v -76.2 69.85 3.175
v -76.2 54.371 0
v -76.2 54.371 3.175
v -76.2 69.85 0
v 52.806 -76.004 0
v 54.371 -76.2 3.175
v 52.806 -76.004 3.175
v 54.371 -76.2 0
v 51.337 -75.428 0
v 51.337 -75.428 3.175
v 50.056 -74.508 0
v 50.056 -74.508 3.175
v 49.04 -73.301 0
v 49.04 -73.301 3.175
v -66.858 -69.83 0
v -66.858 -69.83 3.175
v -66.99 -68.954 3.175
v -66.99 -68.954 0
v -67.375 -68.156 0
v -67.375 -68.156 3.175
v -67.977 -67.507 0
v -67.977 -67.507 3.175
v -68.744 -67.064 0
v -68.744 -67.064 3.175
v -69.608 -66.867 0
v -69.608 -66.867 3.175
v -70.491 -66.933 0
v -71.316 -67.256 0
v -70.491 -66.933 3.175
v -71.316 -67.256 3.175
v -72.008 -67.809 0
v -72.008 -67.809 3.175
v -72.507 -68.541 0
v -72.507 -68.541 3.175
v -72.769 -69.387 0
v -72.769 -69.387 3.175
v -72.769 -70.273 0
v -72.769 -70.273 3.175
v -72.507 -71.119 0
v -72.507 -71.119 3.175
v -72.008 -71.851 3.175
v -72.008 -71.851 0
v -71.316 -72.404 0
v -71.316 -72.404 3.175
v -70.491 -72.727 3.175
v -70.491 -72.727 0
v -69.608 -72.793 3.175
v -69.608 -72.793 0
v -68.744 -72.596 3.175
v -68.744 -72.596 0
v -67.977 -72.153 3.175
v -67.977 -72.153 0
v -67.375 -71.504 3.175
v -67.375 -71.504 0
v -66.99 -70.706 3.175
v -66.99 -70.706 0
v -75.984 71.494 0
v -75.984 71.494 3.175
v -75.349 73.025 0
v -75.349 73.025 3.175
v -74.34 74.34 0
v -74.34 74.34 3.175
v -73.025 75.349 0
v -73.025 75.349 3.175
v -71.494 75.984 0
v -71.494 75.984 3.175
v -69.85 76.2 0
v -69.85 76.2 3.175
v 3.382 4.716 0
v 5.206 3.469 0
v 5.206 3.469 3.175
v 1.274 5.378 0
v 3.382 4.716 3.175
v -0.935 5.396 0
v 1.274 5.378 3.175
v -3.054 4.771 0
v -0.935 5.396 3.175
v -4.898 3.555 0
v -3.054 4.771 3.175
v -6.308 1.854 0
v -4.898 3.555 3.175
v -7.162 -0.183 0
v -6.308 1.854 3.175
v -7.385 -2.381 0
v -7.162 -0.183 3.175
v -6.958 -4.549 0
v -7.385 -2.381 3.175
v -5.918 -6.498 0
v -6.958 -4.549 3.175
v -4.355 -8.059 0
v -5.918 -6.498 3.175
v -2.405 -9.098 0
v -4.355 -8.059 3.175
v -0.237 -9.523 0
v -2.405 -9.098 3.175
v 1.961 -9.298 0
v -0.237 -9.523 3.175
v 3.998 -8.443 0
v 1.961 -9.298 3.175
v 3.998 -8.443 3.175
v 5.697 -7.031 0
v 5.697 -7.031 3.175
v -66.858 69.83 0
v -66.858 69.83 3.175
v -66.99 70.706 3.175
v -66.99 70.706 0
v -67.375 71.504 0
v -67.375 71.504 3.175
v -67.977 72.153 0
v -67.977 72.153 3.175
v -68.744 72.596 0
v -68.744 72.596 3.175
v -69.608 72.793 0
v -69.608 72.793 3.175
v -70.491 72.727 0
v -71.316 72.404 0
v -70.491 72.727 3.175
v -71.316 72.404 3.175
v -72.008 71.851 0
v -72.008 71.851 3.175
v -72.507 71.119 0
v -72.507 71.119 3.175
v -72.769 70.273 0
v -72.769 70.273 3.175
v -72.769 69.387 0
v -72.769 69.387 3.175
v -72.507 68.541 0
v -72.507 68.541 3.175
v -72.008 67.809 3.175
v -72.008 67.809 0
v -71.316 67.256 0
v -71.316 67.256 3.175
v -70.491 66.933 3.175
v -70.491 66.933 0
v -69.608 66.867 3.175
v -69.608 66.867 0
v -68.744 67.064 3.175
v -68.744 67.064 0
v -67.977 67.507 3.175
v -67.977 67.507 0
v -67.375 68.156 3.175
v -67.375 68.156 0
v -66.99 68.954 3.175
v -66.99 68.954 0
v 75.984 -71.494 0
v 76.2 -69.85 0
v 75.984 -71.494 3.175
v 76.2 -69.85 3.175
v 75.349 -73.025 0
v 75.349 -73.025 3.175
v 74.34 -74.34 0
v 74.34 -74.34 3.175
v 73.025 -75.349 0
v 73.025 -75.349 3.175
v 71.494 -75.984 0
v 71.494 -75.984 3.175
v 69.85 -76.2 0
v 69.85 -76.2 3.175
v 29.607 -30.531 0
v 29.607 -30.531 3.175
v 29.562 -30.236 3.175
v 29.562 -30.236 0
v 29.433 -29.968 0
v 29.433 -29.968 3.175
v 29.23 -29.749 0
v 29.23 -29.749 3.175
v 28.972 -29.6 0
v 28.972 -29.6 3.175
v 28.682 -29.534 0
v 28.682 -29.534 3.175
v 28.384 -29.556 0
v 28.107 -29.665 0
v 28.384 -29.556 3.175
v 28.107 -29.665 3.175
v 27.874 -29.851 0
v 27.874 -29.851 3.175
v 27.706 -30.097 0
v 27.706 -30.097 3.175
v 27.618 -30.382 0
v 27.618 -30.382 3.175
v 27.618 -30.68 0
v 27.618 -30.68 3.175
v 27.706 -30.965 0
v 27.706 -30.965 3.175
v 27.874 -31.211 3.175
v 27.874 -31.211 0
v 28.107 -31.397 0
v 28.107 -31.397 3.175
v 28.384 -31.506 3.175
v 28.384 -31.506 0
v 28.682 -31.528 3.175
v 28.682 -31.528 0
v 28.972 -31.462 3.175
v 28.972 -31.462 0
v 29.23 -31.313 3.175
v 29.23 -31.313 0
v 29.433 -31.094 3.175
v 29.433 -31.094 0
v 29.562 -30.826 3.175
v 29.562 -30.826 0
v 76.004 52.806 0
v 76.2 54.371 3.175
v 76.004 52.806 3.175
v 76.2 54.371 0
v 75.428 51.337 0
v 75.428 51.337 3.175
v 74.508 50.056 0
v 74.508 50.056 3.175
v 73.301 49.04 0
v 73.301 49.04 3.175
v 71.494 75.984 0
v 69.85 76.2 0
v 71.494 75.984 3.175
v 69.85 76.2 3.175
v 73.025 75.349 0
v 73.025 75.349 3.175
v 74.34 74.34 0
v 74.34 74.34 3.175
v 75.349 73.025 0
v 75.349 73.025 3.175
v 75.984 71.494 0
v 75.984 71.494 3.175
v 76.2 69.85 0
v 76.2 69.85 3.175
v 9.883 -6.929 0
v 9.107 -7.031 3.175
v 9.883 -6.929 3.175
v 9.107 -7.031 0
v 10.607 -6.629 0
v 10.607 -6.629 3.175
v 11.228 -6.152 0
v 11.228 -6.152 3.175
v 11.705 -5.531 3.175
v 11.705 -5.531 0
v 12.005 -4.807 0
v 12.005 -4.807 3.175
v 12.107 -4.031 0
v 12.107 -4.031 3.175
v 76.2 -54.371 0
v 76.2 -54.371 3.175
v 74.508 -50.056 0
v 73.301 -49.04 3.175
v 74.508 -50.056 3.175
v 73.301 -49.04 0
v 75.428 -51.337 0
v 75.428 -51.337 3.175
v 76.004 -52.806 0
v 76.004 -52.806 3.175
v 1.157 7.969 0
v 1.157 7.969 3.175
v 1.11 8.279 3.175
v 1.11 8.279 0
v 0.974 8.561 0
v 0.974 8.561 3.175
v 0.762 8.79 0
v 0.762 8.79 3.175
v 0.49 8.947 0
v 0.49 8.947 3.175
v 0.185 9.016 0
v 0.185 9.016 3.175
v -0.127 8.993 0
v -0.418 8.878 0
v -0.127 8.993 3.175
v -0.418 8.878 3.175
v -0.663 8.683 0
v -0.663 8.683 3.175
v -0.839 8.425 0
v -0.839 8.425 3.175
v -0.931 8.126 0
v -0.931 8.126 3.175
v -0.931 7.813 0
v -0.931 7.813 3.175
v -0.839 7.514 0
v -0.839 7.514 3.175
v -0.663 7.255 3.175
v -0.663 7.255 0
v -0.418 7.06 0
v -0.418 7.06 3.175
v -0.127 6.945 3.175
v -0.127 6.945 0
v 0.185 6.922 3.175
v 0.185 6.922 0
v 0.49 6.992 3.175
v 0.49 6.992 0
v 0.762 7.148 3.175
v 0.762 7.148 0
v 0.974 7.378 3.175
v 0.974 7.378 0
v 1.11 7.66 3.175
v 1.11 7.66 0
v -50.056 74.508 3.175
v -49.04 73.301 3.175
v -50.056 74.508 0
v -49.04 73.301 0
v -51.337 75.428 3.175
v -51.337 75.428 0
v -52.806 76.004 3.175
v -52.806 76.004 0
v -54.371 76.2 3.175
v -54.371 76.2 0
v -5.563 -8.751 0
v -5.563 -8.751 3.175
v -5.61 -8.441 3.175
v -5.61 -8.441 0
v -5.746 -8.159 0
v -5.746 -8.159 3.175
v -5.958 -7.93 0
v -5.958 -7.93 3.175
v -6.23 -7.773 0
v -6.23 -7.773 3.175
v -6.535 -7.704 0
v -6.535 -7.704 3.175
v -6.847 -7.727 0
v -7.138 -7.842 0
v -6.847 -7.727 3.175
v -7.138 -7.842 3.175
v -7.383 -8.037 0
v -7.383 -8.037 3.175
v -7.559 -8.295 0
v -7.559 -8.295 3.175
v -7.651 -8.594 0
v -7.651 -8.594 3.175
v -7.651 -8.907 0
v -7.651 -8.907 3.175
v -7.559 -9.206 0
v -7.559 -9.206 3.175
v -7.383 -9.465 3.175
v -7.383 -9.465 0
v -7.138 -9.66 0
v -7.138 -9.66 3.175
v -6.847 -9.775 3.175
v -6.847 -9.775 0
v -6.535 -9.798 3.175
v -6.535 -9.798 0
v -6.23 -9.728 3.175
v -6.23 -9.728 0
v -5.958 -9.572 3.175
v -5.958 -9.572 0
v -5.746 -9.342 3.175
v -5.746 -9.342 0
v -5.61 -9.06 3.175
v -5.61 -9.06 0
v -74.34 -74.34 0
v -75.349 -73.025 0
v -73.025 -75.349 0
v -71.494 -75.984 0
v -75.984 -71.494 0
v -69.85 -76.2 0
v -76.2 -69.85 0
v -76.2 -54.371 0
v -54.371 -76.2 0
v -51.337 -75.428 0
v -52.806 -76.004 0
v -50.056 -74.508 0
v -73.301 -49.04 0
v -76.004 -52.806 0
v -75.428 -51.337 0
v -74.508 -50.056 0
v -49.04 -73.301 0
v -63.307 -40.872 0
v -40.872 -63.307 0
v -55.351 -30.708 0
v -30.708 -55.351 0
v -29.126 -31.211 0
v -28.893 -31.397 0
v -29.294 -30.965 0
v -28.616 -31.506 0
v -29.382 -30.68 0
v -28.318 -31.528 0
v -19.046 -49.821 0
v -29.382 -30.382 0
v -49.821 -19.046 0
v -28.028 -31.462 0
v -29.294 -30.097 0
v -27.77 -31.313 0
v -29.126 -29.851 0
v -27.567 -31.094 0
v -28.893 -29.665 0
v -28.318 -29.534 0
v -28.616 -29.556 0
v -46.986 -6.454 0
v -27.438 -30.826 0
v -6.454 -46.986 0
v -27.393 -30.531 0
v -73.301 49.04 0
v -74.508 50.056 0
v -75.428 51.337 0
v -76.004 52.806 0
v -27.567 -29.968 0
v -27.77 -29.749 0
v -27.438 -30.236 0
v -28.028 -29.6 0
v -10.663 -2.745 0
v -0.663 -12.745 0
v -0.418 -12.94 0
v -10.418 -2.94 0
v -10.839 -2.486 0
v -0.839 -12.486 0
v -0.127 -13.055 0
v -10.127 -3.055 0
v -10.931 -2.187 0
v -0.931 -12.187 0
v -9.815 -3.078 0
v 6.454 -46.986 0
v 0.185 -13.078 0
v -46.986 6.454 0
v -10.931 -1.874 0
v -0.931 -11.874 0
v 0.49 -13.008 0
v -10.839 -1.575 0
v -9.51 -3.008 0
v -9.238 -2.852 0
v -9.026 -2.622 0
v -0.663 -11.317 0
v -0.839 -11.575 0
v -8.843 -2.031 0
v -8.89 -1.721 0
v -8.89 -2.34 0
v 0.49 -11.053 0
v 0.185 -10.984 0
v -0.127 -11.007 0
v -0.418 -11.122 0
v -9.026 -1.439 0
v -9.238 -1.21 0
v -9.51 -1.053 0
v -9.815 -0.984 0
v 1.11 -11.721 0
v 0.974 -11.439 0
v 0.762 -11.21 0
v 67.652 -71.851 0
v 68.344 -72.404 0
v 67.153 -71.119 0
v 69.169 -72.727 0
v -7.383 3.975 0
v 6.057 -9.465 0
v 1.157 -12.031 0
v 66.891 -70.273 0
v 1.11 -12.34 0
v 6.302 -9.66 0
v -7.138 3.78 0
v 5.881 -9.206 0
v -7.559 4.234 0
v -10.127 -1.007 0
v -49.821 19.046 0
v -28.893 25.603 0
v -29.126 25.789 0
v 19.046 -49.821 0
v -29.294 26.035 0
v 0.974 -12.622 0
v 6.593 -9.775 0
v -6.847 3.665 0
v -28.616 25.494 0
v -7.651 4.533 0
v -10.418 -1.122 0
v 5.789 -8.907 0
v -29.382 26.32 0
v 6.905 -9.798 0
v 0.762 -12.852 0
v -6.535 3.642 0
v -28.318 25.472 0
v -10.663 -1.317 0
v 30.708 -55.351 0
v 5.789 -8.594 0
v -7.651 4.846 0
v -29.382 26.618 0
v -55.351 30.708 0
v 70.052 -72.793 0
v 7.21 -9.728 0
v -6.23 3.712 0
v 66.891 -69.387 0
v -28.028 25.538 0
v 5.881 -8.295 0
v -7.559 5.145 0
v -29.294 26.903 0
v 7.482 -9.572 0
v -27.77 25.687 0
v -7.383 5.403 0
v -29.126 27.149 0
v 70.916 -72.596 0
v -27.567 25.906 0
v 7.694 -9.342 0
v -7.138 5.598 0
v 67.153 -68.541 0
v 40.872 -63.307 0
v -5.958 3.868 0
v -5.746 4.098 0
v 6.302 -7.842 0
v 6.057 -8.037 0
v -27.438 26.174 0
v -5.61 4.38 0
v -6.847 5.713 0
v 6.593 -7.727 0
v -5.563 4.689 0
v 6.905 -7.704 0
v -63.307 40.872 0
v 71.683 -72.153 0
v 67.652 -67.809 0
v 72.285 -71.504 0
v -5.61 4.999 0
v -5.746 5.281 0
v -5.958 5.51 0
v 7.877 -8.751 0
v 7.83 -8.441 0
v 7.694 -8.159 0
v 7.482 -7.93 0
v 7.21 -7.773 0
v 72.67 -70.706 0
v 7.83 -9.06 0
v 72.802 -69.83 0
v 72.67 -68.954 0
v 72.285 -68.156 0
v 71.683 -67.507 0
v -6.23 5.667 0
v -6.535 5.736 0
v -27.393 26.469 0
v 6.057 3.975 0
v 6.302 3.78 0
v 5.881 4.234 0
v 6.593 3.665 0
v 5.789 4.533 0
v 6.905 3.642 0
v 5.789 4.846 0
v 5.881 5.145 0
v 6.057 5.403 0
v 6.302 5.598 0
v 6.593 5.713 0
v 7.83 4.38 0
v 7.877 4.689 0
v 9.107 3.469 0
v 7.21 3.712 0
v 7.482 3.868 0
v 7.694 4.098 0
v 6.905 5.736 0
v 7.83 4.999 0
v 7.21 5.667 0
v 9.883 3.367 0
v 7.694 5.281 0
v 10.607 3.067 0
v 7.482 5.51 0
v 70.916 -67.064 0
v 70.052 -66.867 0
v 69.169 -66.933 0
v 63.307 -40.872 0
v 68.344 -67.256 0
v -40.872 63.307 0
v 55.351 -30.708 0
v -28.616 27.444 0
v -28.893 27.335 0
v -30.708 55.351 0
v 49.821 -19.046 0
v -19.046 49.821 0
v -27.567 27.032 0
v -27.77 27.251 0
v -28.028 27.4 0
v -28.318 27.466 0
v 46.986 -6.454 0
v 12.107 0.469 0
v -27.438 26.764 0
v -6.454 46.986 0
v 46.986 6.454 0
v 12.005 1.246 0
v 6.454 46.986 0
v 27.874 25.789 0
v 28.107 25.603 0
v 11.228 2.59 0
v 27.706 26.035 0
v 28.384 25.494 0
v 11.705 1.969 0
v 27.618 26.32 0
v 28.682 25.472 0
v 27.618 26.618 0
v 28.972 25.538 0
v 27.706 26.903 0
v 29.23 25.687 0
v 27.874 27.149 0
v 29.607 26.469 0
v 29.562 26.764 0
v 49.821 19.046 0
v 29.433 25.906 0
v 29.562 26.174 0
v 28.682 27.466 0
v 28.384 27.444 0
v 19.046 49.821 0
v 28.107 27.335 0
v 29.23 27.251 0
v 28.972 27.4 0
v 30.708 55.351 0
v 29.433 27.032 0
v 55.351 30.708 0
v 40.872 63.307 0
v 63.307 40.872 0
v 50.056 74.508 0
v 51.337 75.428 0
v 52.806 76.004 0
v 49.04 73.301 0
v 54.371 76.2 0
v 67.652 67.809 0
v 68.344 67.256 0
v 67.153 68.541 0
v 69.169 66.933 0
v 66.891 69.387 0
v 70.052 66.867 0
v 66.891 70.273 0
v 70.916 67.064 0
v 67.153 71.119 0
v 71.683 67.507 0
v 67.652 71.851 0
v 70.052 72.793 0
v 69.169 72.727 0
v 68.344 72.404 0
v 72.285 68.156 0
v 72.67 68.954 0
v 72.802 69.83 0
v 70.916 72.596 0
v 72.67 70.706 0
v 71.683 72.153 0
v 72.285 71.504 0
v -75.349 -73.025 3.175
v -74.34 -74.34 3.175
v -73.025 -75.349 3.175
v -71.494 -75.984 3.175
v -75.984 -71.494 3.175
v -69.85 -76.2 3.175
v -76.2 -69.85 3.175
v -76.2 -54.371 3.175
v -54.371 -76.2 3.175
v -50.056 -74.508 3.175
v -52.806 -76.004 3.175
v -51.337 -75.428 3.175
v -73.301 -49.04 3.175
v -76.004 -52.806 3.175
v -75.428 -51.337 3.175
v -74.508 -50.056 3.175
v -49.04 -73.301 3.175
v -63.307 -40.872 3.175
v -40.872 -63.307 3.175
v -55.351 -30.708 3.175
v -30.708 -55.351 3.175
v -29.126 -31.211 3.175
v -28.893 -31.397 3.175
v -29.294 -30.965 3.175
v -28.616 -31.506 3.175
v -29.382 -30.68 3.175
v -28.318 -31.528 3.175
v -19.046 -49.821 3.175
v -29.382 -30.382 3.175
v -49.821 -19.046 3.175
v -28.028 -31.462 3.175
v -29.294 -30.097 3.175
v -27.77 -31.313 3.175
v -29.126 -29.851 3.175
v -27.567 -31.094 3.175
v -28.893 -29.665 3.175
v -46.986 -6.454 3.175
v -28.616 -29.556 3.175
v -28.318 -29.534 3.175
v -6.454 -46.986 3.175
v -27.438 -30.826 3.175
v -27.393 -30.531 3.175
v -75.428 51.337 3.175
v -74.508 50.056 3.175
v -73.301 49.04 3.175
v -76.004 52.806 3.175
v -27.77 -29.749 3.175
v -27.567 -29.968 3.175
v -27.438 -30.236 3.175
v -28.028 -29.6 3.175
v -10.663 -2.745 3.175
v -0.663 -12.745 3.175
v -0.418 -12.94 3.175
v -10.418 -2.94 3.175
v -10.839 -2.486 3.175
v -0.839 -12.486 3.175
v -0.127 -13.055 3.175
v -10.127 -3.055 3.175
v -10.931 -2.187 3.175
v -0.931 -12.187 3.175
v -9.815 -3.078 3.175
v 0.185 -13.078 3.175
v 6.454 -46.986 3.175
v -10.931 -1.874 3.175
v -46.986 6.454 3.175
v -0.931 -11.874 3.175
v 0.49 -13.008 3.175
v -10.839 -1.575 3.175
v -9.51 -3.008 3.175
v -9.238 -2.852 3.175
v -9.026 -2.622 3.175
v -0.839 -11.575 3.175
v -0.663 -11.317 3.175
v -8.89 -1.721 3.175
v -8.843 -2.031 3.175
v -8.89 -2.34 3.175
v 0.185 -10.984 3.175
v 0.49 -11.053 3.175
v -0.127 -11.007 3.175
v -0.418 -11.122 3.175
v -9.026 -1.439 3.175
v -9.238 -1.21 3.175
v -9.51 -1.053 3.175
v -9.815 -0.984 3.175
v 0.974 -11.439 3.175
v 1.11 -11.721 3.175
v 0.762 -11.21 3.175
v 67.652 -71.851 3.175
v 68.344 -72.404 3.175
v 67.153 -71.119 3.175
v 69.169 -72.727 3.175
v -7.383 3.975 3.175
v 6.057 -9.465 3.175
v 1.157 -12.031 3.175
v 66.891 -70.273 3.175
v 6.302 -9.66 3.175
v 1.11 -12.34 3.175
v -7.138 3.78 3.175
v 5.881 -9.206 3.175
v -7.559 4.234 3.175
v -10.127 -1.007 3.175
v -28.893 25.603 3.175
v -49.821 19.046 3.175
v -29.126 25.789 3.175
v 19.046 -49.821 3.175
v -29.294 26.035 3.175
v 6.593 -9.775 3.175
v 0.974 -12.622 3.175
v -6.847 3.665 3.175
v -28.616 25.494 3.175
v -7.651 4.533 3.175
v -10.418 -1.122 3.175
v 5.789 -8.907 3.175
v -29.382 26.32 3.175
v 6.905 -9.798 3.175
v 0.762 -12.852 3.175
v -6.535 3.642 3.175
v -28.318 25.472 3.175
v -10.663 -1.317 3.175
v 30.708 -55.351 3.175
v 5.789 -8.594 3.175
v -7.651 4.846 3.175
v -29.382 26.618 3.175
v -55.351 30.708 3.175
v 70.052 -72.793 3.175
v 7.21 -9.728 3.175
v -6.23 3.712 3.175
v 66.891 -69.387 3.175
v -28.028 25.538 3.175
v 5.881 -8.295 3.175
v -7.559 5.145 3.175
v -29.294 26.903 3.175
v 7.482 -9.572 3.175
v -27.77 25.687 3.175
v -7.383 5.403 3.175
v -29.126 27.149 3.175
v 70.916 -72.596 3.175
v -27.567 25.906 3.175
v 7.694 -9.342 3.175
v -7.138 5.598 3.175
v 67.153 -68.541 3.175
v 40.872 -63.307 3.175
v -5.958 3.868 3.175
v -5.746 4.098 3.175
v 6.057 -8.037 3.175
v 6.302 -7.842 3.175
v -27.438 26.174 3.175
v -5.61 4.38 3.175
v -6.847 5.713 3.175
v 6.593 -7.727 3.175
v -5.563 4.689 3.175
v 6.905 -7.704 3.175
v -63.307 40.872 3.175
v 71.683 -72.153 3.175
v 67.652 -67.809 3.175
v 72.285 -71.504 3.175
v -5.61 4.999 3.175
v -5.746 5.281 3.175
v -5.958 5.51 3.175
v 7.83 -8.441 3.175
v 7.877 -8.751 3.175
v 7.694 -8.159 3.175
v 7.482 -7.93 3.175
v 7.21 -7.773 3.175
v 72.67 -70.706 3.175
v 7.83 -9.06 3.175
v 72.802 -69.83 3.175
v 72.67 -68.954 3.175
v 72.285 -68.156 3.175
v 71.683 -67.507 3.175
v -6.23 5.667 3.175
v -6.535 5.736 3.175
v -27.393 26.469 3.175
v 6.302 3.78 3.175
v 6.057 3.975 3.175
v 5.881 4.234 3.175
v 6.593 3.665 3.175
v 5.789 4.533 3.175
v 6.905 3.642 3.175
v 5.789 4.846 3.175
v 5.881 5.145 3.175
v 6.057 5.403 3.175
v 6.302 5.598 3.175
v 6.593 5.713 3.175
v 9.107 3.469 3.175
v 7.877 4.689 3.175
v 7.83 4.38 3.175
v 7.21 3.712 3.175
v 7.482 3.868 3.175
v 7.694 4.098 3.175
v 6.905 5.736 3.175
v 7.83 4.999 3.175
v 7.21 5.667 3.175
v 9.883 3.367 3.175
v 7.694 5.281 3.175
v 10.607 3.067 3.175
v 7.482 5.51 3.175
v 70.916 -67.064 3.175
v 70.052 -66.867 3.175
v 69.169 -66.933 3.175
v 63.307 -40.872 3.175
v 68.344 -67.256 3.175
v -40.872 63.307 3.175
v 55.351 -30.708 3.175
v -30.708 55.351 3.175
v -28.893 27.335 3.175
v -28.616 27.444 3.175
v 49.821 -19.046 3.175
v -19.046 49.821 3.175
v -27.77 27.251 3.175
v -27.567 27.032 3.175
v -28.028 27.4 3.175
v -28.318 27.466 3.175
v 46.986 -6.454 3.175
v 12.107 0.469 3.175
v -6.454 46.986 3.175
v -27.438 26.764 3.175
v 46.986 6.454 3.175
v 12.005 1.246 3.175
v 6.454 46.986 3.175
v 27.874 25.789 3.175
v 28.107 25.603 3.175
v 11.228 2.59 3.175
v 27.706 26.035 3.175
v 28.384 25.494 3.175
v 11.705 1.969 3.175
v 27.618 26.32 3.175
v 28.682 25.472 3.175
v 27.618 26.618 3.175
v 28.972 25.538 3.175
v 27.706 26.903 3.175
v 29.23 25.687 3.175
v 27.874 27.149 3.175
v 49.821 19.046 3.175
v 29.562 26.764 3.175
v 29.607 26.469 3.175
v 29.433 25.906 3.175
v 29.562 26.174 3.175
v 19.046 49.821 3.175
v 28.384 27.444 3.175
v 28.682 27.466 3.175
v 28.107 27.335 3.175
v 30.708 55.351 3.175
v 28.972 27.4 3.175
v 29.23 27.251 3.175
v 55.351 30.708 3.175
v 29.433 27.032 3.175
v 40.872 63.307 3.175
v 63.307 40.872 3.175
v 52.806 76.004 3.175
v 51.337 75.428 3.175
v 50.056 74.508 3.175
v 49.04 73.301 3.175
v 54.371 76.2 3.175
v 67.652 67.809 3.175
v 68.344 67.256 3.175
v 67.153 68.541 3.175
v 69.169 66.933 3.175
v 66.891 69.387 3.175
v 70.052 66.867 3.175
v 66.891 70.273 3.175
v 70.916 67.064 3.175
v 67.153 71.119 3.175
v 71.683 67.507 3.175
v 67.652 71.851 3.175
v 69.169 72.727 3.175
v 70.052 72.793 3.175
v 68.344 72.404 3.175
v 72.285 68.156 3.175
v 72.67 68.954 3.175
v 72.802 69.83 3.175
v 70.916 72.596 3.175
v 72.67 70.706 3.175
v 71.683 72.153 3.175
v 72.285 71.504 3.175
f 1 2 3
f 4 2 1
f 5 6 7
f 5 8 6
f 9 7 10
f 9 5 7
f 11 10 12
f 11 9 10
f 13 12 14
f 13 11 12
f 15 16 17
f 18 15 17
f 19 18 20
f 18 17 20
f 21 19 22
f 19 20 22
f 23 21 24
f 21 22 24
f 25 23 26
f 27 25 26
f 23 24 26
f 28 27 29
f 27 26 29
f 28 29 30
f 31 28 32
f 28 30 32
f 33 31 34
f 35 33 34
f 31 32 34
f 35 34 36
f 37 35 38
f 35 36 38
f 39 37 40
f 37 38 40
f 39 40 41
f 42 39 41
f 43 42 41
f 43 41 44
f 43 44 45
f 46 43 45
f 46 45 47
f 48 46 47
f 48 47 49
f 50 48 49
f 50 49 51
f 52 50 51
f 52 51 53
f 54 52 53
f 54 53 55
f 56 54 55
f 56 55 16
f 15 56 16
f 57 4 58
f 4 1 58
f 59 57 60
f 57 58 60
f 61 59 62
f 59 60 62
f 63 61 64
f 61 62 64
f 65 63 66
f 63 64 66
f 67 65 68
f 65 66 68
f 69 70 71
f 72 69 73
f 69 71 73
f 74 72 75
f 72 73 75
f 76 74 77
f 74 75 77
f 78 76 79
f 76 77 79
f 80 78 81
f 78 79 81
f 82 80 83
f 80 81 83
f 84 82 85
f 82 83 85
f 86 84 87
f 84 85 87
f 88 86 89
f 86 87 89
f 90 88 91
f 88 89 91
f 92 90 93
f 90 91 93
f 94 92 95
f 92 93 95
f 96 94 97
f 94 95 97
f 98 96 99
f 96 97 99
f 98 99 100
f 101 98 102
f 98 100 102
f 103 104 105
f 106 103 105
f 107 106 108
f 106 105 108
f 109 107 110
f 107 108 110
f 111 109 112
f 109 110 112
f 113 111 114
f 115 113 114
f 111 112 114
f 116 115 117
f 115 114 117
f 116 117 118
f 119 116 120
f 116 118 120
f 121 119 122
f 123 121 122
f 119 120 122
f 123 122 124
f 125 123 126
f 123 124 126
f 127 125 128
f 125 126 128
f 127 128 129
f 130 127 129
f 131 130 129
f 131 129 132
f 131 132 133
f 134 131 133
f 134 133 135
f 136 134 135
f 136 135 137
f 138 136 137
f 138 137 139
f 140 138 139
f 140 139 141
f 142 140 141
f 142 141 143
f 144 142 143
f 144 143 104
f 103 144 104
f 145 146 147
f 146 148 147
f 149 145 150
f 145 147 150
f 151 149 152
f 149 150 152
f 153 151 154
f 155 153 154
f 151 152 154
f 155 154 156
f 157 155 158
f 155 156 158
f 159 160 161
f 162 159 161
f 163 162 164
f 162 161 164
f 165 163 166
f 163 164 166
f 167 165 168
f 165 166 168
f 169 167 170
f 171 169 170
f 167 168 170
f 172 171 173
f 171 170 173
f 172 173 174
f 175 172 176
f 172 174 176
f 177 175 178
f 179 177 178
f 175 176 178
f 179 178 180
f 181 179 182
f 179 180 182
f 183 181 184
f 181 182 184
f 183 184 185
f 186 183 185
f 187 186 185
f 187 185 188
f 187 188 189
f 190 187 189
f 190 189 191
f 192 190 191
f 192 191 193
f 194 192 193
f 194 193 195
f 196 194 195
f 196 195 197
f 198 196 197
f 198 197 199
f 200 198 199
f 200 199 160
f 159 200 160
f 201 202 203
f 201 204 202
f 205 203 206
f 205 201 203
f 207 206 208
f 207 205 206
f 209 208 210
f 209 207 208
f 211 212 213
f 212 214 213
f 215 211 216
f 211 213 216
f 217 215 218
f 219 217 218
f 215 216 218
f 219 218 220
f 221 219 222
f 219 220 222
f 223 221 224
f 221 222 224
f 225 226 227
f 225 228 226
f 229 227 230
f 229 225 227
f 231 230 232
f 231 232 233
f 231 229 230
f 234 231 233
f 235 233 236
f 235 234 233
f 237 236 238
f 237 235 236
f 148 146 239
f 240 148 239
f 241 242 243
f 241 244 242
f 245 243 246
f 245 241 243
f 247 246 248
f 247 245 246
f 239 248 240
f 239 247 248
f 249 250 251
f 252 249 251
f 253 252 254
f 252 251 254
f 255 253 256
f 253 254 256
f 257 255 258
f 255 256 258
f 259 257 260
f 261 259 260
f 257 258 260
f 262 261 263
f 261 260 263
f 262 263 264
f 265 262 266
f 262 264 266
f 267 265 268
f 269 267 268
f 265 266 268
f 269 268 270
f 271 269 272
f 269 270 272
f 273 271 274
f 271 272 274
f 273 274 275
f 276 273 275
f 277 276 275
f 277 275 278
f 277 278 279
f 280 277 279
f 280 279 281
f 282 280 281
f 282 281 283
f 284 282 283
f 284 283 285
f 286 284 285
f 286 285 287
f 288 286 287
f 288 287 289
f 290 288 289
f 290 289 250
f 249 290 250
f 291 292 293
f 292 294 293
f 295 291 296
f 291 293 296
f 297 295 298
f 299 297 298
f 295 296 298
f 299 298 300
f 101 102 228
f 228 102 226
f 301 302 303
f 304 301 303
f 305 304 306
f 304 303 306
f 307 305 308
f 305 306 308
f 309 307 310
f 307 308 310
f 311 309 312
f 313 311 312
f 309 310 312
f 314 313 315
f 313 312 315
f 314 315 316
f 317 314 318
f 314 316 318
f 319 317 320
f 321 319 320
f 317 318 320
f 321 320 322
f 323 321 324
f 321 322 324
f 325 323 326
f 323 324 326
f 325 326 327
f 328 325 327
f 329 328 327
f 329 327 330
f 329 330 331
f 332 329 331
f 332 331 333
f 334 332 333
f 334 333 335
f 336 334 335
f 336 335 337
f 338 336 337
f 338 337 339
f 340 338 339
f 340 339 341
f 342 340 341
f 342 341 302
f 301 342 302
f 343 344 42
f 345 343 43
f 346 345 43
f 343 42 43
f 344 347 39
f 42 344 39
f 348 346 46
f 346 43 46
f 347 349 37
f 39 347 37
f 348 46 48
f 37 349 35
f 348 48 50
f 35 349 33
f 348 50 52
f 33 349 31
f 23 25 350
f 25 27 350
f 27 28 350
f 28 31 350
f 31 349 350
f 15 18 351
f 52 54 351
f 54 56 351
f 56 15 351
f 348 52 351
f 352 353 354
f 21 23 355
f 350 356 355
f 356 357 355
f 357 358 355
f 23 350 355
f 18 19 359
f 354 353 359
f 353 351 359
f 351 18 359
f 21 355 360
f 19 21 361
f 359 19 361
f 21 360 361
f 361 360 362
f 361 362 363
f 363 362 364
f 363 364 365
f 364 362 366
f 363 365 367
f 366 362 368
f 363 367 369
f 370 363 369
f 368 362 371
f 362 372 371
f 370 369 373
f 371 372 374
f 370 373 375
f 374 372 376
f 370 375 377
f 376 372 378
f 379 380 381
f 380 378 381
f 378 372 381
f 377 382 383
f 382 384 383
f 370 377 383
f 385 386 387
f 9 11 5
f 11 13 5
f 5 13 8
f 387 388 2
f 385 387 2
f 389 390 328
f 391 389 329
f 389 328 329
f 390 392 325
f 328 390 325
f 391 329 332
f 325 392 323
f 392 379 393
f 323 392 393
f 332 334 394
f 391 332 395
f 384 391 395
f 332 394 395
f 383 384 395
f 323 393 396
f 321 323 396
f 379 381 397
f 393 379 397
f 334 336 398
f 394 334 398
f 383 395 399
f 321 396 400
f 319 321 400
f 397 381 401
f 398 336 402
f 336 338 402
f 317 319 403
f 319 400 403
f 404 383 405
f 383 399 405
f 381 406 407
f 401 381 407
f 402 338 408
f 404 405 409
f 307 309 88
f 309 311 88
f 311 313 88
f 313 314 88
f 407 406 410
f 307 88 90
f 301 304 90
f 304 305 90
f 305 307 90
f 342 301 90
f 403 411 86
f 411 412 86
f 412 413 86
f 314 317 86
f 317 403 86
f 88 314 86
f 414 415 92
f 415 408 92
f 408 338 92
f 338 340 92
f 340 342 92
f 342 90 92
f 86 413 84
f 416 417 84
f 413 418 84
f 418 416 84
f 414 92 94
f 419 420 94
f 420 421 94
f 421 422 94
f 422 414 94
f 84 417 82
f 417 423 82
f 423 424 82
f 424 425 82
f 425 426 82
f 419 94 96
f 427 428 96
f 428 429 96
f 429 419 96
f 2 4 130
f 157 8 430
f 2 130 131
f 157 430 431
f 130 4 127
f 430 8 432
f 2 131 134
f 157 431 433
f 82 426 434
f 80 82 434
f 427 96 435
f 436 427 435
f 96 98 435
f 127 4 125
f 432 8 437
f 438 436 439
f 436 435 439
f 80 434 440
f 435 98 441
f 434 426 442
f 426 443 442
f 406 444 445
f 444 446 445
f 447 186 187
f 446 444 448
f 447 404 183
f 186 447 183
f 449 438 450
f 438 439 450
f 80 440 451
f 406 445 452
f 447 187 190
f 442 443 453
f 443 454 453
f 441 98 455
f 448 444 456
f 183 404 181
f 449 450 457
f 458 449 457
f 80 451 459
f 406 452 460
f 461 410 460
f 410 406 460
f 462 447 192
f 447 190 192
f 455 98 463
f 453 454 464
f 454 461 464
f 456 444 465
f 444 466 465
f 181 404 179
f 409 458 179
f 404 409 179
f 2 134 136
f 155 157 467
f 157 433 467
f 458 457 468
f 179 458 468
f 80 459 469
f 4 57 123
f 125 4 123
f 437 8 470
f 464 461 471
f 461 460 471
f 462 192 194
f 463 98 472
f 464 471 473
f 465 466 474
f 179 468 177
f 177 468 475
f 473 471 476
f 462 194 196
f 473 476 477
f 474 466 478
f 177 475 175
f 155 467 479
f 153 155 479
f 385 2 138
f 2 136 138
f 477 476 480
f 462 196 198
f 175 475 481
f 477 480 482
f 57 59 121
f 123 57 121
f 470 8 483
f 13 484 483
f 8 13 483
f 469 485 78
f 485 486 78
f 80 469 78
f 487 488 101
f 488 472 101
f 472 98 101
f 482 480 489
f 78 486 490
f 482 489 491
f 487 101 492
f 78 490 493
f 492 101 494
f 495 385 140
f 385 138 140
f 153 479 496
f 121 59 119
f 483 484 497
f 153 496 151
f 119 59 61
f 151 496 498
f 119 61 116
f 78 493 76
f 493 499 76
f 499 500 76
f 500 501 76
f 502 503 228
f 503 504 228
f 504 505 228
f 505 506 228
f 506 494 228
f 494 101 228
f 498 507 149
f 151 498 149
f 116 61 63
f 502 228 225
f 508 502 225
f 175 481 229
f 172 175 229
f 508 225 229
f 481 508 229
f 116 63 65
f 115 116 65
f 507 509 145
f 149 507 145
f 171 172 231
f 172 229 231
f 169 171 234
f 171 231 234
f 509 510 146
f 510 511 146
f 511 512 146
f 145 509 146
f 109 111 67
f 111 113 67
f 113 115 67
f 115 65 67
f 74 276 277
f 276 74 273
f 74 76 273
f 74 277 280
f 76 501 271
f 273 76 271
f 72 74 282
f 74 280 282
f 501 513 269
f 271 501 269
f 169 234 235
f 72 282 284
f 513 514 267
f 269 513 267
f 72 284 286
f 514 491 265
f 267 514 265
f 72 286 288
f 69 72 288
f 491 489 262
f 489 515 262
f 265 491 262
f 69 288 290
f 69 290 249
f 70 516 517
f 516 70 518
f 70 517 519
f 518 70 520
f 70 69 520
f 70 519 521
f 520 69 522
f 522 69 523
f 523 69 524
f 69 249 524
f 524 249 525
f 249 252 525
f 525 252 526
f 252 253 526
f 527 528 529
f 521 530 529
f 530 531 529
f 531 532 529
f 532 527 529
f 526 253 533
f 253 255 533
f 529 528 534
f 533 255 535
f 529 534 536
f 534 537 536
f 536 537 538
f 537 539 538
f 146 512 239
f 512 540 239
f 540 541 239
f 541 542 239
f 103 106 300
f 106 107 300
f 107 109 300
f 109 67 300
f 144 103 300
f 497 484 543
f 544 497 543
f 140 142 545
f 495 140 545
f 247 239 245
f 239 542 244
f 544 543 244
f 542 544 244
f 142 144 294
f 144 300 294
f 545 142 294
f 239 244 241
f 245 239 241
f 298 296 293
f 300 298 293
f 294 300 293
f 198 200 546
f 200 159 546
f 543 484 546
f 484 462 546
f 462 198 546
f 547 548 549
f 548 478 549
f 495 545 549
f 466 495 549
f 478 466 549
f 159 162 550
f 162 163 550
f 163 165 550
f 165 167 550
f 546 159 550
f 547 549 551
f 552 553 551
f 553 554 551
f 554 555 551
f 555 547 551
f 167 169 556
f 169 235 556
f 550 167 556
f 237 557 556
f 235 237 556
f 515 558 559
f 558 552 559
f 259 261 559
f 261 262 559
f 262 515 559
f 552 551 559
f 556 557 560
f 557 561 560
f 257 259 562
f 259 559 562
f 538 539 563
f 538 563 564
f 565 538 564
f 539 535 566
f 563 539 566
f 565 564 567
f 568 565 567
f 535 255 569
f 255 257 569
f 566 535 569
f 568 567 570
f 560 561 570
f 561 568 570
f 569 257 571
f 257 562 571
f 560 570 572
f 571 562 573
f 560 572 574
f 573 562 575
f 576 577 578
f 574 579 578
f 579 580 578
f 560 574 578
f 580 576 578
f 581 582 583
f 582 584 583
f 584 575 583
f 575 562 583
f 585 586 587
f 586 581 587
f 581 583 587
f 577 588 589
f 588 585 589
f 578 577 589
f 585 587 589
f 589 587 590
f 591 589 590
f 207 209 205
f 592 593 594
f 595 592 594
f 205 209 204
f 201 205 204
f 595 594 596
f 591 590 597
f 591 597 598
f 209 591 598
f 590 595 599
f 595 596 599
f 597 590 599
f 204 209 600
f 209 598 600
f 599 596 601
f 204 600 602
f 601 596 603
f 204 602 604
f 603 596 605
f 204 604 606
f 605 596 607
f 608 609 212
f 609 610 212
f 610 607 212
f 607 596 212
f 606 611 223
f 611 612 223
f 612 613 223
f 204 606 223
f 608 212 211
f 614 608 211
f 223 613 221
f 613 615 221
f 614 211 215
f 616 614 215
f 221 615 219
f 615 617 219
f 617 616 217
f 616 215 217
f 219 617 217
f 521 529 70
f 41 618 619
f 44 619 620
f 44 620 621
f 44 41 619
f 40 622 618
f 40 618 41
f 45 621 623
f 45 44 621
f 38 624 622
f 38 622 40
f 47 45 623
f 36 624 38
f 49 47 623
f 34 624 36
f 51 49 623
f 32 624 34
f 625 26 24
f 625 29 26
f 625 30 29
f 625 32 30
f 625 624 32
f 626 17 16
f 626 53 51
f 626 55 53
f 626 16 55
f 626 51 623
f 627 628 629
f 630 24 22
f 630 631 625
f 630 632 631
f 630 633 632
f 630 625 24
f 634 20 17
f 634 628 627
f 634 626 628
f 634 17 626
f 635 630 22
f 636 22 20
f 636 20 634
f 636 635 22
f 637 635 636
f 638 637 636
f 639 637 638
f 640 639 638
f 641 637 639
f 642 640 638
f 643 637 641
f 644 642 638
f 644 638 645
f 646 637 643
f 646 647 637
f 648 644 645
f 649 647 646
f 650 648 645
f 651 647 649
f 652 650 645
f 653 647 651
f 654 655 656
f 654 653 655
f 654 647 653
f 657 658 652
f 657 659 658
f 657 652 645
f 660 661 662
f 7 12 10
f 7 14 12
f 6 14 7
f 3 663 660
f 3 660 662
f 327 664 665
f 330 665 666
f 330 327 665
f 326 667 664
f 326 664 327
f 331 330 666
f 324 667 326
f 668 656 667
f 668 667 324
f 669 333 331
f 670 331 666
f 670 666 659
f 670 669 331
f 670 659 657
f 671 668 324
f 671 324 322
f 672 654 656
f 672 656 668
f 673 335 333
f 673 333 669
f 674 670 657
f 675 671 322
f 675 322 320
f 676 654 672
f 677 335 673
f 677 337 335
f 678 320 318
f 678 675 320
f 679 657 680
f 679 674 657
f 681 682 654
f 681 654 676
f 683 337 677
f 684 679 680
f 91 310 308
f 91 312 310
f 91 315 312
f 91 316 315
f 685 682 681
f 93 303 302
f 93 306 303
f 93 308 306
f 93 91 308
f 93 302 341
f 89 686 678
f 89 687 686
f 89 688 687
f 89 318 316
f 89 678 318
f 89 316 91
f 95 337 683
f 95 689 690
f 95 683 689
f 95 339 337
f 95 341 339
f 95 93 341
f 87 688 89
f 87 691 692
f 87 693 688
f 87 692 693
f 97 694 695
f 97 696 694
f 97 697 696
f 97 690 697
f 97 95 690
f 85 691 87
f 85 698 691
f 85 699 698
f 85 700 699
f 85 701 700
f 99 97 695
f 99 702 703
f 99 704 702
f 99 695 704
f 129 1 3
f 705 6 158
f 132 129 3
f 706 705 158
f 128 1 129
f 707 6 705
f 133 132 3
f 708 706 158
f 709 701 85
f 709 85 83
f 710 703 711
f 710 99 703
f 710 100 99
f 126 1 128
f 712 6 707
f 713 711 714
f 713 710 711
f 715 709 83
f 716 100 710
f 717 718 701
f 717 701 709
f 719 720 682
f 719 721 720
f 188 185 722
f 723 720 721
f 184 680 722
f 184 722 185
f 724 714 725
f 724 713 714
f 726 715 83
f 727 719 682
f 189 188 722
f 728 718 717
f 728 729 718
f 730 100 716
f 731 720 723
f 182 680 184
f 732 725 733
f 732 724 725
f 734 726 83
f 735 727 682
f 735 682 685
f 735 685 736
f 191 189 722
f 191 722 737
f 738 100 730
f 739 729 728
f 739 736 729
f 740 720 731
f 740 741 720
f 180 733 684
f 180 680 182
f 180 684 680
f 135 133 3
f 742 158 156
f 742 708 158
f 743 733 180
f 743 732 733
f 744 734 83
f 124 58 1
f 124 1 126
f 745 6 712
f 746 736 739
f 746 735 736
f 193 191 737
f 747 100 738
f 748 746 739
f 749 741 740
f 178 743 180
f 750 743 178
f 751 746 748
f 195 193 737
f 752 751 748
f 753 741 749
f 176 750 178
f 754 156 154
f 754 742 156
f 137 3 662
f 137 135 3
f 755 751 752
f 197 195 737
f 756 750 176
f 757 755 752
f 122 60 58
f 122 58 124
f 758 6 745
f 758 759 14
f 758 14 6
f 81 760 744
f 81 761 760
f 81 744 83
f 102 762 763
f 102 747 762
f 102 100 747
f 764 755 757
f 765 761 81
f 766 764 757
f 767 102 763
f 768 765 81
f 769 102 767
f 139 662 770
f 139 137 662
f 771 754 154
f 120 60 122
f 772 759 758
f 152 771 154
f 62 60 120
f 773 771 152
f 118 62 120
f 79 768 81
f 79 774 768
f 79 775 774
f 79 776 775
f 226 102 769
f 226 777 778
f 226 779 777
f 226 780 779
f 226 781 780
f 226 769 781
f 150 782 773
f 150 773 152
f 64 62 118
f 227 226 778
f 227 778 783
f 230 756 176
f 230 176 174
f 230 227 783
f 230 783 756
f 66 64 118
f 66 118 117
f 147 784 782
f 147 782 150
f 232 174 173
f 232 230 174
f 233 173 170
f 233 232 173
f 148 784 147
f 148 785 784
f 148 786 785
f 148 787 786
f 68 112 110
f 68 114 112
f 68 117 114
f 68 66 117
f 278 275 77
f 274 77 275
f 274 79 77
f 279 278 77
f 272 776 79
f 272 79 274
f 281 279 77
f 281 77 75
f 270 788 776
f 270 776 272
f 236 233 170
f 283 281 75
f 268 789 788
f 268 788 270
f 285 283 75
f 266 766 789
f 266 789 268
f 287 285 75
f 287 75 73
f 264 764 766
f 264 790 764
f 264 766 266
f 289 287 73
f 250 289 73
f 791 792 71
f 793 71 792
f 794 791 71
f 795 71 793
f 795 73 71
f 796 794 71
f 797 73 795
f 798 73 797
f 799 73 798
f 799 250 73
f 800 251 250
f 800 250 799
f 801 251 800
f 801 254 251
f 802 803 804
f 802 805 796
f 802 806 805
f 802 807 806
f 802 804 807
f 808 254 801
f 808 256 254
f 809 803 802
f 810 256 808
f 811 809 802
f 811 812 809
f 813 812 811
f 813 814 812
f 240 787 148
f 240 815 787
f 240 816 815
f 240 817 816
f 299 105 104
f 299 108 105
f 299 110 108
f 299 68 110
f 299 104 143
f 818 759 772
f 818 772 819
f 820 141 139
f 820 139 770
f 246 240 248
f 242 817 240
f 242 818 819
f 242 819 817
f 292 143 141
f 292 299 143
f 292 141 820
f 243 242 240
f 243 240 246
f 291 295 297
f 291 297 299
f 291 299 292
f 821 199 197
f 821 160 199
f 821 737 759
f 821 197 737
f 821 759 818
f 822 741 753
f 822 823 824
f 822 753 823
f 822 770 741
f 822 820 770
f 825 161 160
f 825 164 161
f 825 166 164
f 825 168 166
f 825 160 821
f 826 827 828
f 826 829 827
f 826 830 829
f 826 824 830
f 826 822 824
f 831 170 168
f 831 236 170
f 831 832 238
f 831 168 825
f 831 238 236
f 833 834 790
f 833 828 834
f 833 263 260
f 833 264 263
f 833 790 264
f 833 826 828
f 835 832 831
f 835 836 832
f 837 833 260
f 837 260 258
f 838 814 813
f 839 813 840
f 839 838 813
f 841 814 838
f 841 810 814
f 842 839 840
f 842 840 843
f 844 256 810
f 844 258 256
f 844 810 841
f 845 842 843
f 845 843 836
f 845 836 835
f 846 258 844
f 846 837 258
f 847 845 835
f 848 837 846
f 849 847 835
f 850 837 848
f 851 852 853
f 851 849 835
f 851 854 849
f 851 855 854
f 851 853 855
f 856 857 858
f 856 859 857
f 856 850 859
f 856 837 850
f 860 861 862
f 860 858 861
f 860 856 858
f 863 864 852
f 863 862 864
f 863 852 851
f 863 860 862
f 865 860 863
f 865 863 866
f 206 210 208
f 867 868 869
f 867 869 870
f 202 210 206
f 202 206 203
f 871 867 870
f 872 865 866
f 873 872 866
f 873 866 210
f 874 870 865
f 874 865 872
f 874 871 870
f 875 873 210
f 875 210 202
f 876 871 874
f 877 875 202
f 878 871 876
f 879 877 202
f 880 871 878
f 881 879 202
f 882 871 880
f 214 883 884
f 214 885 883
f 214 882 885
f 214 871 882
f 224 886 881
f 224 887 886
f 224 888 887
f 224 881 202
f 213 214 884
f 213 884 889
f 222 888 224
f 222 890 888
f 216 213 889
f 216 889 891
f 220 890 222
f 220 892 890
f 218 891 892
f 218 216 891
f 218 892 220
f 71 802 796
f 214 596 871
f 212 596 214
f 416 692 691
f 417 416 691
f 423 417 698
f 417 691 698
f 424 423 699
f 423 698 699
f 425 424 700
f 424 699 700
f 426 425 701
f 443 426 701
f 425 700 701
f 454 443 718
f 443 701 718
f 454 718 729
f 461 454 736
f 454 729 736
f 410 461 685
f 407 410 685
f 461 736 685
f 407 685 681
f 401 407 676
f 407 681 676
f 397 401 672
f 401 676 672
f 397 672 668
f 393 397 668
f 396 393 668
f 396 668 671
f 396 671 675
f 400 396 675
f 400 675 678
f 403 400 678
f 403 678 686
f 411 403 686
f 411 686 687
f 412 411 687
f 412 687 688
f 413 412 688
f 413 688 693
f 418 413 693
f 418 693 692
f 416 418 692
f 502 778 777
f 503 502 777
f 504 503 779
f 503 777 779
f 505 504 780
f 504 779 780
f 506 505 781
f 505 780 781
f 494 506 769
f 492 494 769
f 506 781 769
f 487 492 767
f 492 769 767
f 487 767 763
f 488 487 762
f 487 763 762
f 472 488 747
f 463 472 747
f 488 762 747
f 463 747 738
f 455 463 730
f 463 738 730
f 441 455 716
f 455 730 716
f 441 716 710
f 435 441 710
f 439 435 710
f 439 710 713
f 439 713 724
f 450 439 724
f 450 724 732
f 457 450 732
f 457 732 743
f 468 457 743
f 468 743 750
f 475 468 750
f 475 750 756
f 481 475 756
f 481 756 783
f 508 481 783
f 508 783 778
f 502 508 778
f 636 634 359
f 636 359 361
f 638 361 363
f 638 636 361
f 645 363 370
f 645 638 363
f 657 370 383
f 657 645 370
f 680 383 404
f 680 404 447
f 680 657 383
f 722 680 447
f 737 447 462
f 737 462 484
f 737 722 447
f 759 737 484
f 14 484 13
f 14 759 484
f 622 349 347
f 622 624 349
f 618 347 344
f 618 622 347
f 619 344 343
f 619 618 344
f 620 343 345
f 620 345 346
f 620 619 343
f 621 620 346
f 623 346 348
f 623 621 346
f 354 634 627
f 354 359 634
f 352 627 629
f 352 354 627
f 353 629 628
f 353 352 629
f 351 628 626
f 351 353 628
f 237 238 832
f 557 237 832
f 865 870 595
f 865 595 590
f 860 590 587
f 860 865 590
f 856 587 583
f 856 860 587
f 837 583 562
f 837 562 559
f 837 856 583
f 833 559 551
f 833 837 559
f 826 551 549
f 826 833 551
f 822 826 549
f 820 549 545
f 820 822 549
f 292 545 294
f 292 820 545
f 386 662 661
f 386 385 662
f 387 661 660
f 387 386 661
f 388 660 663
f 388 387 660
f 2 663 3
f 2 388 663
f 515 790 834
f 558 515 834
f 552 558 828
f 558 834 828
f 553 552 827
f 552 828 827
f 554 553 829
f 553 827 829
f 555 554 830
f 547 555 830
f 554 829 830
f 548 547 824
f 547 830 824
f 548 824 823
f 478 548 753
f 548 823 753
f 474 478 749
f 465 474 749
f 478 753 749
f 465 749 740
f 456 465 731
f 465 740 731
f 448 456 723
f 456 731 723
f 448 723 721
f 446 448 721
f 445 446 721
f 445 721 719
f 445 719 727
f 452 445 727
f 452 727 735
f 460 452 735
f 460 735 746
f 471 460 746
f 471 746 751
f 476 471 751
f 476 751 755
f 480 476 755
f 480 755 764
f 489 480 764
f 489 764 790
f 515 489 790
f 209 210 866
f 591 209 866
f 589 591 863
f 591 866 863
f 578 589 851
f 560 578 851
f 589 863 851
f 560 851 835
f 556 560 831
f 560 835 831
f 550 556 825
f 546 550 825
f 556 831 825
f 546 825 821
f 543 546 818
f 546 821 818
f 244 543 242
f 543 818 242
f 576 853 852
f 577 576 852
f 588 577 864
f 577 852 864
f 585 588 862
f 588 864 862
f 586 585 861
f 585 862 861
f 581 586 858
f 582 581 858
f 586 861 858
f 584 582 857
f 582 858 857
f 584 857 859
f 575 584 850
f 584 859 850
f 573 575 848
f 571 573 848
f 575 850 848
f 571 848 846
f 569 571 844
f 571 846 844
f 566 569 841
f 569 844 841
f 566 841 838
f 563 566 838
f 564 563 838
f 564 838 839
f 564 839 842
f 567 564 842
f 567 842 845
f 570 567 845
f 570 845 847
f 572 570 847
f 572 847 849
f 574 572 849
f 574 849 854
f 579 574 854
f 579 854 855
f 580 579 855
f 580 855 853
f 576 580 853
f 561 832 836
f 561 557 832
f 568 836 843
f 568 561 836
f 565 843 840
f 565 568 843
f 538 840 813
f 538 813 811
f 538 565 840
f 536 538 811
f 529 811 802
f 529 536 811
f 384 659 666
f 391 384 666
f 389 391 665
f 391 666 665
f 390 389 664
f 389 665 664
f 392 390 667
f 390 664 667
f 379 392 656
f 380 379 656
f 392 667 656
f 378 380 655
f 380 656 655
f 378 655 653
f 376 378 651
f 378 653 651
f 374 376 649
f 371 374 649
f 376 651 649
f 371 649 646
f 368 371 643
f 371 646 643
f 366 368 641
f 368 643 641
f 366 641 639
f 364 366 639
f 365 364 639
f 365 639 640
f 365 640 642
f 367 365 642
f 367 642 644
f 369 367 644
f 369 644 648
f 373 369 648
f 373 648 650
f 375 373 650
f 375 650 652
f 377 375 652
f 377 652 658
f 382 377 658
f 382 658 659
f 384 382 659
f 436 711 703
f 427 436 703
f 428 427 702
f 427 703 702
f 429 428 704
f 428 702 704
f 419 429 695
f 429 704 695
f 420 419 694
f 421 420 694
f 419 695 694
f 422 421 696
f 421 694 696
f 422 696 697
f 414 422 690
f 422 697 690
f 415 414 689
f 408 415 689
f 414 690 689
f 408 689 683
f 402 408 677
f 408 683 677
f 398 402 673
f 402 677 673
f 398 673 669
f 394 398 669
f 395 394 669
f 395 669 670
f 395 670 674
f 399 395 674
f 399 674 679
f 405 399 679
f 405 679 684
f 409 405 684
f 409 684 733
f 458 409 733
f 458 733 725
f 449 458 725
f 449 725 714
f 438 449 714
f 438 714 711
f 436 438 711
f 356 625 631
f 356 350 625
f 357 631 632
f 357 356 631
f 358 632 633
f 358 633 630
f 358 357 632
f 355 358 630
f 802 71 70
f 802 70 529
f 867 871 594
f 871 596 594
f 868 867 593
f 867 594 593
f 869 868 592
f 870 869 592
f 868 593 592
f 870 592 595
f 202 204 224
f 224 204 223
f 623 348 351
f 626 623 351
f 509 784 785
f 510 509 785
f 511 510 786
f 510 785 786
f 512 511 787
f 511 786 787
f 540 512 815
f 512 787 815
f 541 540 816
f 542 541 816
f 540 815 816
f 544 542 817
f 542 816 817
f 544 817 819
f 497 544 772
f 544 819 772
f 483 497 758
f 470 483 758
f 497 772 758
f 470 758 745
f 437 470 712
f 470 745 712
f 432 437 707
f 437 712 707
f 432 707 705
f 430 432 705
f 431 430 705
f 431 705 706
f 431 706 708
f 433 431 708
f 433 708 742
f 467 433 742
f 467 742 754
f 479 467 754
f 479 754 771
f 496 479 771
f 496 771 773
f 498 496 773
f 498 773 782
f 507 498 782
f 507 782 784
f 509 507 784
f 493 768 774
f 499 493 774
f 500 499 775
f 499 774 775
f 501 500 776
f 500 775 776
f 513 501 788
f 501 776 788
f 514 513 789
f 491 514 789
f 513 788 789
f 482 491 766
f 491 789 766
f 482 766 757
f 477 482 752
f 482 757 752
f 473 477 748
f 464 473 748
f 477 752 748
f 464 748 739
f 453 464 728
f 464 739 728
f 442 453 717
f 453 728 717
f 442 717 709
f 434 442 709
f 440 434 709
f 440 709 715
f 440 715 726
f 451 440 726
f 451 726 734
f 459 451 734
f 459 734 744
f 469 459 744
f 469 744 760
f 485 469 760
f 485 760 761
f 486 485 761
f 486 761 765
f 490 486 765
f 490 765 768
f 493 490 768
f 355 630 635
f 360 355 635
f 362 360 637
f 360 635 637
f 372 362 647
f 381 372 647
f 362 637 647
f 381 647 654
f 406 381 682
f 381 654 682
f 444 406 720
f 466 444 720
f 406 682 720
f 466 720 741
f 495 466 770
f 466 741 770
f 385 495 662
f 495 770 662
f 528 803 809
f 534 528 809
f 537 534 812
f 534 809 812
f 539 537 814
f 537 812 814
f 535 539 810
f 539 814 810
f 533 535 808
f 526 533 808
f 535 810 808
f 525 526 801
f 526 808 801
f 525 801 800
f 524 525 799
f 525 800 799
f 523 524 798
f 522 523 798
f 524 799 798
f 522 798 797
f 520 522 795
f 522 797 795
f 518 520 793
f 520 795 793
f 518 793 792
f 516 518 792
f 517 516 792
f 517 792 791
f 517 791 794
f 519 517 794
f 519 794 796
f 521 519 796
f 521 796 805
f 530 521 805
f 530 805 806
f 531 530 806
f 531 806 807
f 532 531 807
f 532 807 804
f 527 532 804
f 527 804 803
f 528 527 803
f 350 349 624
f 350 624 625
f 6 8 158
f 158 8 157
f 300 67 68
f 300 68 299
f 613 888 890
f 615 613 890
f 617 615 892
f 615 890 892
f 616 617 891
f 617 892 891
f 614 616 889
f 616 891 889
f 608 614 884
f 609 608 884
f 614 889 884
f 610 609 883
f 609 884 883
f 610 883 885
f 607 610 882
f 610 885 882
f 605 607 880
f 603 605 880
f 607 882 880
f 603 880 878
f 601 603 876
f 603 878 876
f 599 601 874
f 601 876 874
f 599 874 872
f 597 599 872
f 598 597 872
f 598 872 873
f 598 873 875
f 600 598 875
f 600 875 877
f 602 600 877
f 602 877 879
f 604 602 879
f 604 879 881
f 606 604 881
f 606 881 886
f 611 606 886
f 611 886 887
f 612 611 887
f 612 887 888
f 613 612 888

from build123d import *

# Parameters (mm, degrees)
SKETCH3_W             = 152.4
SKETCH3_H             = 152.4
BOSS_EXTRUDE3_DEPTH   = 3.175
SKETCH13_R            = 7.5
CUT_EXTRUDE5_DEPTH    = 4.175
SKETCH15_R            = 1
CUT_EXTRUDE6_DEPTH    = 4.175
SKETCH17_W            = 12
SKETCH17_H            = 10.5
CUT_EXTRUDE7_DEPTH    = 4.175
FILLET1_R             = 3
SKETCH19_R            = 1.05
CUT_EXTRUDE8_DEPTH    = 4.175
SKETCH20_R            = 2.9718
BOLT_HOLES_DEPTH      = 1
BOLT_HOLES_DEPTH_BACK = 4.175
CUT_EXTRUDE12_DEPTH   = 3.175
FILLET2_R             = 6.35
MIRROR5_COPY_1_DEPTH  = 3.175
FILLET3_R             = 6.35
FILLET4_R             = 6.35


with BuildPart() as part:
    # Sketch3 → Boss-Extrude3 (new body)
    with BuildSketch(Plane.XY):
        Rectangle(SKETCH3_W, SKETCH3_H)
    extrude(amount=BOSS_EXTRUDE3_DEPTH)

    # Sketch13 → Cut-Extrude5 (cut, through all)
    with BuildSketch(Plane(origin=(0.106889783, -2.03090588, 3.175), x_dir=(1, 0, 0), z_dir=(0, 0, 1))):
        Circle(SKETCH13_R)
    extrude(amount=-CUT_EXTRUDE5_DEPTH, mode=Mode.SUBTRACT)

    # Sketch15 → Cut-Extrude6 (cut, through all)
    with BuildSketch(Plane(origin=(0.106889783, -2.03090588, 3.175), x_dir=(1, 0, 0), z_dir=(0, 0, 1))):
        with Locations((-28.5, -28.5)):
            Circle(SKETCH15_R)
        with Locations((-28.5, 28.5)):
            Circle(SKETCH15_R)
        with Locations((28.5, -28.5)):
            Circle(SKETCH15_R)
        with Locations((28.5, 28.5)):
            Circle(SKETCH15_R)
    extrude(amount=-CUT_EXTRUDE6_DEPTH, mode=Mode.SUBTRACT)

    # Sketch17 → Cut-Extrude7 (cut, through all)
    with BuildSketch(Plane(origin=(0.106889783, -2.03090588, 3.175), x_dir=(1, 0, 0), z_dir=(0, 0, 1))):
        with Locations((6, 0.25)):
            Rectangle(SKETCH17_W, SKETCH17_H)
    extrude(amount=-CUT_EXTRUDE7_DEPTH, mode=Mode.SUBTRACT)

    # Fillet1
    fillet1_edges = [part.edges().sort_by_distance(p)[0] for p in [
        (12.106889783, -7.03090588, 1.5875),
        (12.106889783, 3.46909412, 1.5875),
    ]]
    fillet(fillet1_edges, radius=FILLET1_R)

    # Sketch19 → Cut-Extrude8 (cut, through all)
    with BuildSketch(Plane(origin=(0.106889783, -2.03090588, 3.175), x_dir=(1, 0, 0), z_dir=(0, 0, 1))):
        with Locations((6.72, 6.72)):
            Circle(SKETCH19_R)
        with Locations((-6.72, 6.72)):
            Circle(SKETCH19_R)
        with Locations((-6.72, -6.72)):
            Circle(SKETCH19_R)
        with Locations((6.72, -6.72)):
            Circle(SKETCH19_R)
        with Locations((0, 10)):
            Circle(SKETCH19_R)
        with Locations((-10, 0)):
            Circle(SKETCH19_R)
        with Locations((0, -10)):
            Circle(SKETCH19_R)
    extrude(amount=-CUT_EXTRUDE8_DEPTH, mode=Mode.SUBTRACT)

    # Sketch20 → Bolt Holes (cut, two sides)
    with BuildSketch(Plane.XY.offset(3.175)) as bolt_holes_sk:
        with Locations((-69.83, 69.83)):
            Circle(SKETCH20_R)
        with Locations((69.83, 69.83)):
            Circle(SKETCH20_R)
        with Locations((69.83, -69.83)):
            Circle(SKETCH20_R)
        with Locations((-69.83, -69.83)):
            Circle(SKETCH20_R)
    extrude(amount=BOLT_HOLES_DEPTH, mode=Mode.SUBTRACT)
    extrude(bolt_holes_sk.sketch, amount=-BOLT_HOLES_DEPTH_BACK, mode=Mode.SUBTRACT)

    # Sketch25 → Cut-Extrude12 (cut)
    with BuildSketch(Plane.XY.offset(3.175)):
        with BuildLine():
            Line((-76.2, 50.8), (-76.2, -50.8))
            ThreePointArc((-76.2, -50.8), (-46.628854397, 0), (-76.2, 50.8))
        make_face()
    cut_extrude12 = extrude(amount=-CUT_EXTRUDE12_DEPTH, mode=Mode.SUBTRACT)

    # Fillet2
    fillet2_edges = [part.edges().sort_by_distance(p)[0] for p in [
        (-76.2, -50.8, 1.5875),
        (-76.2, 50.8, 1.5875),
        (-76.2, -76.2, 1.5875),
        (-76.2, 76.2, 1.5875),
    ]]
    fillet(fillet2_edges, radius=FILLET2_R)

    # Mirror4: Cut-Extrude12 across plane
    add(cut_extrude12.mirror(Plane(origin=(0, 0, 0), x_dir=(0, 0, 1), z_dir=(0.707106781, -0.707106781, 0))), mode=Mode.SUBTRACT)

    # Mirror5: Cut-Extrude12 across plane
    add(cut_extrude12.mirror(Plane(origin=(0, 0, 0), x_dir=(0, 0, 1), z_dir=(-0.707106781, -0.707106781, 0))), mode=Mode.SUBTRACT)

    # Mirror5 copy 1 sketch → Mirror5 copy 1 (cut)
    with BuildSketch(Plane(origin=(0, 0, 3.175), x_dir=(-1, 0, 0), z_dir=(0, 0, 1))):
        with BuildLine():
            Line((-76.2, 50.8), (-76.2, -50.8))
            ThreePointArc((-76.2, -50.8), (-46.628854397, 0), (-76.2, 50.8))
        make_face()
    extrude(amount=-MIRROR5_COPY_1_DEPTH, mode=Mode.SUBTRACT)

    # Fillet3
    fillet3_edges = [part.edges().sort_by_distance(p)[0] for p in [
        (-50.8, -76.2, 1.5875),
        (50.8, -76.2, 1.5875),
        (76.2, 50.8, 1.5875),
        (76.2, -50.8, 1.5875),
        (76.2, -76.2, 1.5875),
        (76.2, 76.2, 1.5875),
    ]]
    fillet(fillet3_edges, radius=FILLET3_R)

    # Fillet4
    fillet4_edges = [part.edges().sort_by_distance(p)[0] for p in [
        (50.8, 76.2, 1.5875),
        (-50.8, 76.2, 1.5875),
    ]]
    fillet(fillet4_edges, radius=FILLET4_R)


solid = part.part
